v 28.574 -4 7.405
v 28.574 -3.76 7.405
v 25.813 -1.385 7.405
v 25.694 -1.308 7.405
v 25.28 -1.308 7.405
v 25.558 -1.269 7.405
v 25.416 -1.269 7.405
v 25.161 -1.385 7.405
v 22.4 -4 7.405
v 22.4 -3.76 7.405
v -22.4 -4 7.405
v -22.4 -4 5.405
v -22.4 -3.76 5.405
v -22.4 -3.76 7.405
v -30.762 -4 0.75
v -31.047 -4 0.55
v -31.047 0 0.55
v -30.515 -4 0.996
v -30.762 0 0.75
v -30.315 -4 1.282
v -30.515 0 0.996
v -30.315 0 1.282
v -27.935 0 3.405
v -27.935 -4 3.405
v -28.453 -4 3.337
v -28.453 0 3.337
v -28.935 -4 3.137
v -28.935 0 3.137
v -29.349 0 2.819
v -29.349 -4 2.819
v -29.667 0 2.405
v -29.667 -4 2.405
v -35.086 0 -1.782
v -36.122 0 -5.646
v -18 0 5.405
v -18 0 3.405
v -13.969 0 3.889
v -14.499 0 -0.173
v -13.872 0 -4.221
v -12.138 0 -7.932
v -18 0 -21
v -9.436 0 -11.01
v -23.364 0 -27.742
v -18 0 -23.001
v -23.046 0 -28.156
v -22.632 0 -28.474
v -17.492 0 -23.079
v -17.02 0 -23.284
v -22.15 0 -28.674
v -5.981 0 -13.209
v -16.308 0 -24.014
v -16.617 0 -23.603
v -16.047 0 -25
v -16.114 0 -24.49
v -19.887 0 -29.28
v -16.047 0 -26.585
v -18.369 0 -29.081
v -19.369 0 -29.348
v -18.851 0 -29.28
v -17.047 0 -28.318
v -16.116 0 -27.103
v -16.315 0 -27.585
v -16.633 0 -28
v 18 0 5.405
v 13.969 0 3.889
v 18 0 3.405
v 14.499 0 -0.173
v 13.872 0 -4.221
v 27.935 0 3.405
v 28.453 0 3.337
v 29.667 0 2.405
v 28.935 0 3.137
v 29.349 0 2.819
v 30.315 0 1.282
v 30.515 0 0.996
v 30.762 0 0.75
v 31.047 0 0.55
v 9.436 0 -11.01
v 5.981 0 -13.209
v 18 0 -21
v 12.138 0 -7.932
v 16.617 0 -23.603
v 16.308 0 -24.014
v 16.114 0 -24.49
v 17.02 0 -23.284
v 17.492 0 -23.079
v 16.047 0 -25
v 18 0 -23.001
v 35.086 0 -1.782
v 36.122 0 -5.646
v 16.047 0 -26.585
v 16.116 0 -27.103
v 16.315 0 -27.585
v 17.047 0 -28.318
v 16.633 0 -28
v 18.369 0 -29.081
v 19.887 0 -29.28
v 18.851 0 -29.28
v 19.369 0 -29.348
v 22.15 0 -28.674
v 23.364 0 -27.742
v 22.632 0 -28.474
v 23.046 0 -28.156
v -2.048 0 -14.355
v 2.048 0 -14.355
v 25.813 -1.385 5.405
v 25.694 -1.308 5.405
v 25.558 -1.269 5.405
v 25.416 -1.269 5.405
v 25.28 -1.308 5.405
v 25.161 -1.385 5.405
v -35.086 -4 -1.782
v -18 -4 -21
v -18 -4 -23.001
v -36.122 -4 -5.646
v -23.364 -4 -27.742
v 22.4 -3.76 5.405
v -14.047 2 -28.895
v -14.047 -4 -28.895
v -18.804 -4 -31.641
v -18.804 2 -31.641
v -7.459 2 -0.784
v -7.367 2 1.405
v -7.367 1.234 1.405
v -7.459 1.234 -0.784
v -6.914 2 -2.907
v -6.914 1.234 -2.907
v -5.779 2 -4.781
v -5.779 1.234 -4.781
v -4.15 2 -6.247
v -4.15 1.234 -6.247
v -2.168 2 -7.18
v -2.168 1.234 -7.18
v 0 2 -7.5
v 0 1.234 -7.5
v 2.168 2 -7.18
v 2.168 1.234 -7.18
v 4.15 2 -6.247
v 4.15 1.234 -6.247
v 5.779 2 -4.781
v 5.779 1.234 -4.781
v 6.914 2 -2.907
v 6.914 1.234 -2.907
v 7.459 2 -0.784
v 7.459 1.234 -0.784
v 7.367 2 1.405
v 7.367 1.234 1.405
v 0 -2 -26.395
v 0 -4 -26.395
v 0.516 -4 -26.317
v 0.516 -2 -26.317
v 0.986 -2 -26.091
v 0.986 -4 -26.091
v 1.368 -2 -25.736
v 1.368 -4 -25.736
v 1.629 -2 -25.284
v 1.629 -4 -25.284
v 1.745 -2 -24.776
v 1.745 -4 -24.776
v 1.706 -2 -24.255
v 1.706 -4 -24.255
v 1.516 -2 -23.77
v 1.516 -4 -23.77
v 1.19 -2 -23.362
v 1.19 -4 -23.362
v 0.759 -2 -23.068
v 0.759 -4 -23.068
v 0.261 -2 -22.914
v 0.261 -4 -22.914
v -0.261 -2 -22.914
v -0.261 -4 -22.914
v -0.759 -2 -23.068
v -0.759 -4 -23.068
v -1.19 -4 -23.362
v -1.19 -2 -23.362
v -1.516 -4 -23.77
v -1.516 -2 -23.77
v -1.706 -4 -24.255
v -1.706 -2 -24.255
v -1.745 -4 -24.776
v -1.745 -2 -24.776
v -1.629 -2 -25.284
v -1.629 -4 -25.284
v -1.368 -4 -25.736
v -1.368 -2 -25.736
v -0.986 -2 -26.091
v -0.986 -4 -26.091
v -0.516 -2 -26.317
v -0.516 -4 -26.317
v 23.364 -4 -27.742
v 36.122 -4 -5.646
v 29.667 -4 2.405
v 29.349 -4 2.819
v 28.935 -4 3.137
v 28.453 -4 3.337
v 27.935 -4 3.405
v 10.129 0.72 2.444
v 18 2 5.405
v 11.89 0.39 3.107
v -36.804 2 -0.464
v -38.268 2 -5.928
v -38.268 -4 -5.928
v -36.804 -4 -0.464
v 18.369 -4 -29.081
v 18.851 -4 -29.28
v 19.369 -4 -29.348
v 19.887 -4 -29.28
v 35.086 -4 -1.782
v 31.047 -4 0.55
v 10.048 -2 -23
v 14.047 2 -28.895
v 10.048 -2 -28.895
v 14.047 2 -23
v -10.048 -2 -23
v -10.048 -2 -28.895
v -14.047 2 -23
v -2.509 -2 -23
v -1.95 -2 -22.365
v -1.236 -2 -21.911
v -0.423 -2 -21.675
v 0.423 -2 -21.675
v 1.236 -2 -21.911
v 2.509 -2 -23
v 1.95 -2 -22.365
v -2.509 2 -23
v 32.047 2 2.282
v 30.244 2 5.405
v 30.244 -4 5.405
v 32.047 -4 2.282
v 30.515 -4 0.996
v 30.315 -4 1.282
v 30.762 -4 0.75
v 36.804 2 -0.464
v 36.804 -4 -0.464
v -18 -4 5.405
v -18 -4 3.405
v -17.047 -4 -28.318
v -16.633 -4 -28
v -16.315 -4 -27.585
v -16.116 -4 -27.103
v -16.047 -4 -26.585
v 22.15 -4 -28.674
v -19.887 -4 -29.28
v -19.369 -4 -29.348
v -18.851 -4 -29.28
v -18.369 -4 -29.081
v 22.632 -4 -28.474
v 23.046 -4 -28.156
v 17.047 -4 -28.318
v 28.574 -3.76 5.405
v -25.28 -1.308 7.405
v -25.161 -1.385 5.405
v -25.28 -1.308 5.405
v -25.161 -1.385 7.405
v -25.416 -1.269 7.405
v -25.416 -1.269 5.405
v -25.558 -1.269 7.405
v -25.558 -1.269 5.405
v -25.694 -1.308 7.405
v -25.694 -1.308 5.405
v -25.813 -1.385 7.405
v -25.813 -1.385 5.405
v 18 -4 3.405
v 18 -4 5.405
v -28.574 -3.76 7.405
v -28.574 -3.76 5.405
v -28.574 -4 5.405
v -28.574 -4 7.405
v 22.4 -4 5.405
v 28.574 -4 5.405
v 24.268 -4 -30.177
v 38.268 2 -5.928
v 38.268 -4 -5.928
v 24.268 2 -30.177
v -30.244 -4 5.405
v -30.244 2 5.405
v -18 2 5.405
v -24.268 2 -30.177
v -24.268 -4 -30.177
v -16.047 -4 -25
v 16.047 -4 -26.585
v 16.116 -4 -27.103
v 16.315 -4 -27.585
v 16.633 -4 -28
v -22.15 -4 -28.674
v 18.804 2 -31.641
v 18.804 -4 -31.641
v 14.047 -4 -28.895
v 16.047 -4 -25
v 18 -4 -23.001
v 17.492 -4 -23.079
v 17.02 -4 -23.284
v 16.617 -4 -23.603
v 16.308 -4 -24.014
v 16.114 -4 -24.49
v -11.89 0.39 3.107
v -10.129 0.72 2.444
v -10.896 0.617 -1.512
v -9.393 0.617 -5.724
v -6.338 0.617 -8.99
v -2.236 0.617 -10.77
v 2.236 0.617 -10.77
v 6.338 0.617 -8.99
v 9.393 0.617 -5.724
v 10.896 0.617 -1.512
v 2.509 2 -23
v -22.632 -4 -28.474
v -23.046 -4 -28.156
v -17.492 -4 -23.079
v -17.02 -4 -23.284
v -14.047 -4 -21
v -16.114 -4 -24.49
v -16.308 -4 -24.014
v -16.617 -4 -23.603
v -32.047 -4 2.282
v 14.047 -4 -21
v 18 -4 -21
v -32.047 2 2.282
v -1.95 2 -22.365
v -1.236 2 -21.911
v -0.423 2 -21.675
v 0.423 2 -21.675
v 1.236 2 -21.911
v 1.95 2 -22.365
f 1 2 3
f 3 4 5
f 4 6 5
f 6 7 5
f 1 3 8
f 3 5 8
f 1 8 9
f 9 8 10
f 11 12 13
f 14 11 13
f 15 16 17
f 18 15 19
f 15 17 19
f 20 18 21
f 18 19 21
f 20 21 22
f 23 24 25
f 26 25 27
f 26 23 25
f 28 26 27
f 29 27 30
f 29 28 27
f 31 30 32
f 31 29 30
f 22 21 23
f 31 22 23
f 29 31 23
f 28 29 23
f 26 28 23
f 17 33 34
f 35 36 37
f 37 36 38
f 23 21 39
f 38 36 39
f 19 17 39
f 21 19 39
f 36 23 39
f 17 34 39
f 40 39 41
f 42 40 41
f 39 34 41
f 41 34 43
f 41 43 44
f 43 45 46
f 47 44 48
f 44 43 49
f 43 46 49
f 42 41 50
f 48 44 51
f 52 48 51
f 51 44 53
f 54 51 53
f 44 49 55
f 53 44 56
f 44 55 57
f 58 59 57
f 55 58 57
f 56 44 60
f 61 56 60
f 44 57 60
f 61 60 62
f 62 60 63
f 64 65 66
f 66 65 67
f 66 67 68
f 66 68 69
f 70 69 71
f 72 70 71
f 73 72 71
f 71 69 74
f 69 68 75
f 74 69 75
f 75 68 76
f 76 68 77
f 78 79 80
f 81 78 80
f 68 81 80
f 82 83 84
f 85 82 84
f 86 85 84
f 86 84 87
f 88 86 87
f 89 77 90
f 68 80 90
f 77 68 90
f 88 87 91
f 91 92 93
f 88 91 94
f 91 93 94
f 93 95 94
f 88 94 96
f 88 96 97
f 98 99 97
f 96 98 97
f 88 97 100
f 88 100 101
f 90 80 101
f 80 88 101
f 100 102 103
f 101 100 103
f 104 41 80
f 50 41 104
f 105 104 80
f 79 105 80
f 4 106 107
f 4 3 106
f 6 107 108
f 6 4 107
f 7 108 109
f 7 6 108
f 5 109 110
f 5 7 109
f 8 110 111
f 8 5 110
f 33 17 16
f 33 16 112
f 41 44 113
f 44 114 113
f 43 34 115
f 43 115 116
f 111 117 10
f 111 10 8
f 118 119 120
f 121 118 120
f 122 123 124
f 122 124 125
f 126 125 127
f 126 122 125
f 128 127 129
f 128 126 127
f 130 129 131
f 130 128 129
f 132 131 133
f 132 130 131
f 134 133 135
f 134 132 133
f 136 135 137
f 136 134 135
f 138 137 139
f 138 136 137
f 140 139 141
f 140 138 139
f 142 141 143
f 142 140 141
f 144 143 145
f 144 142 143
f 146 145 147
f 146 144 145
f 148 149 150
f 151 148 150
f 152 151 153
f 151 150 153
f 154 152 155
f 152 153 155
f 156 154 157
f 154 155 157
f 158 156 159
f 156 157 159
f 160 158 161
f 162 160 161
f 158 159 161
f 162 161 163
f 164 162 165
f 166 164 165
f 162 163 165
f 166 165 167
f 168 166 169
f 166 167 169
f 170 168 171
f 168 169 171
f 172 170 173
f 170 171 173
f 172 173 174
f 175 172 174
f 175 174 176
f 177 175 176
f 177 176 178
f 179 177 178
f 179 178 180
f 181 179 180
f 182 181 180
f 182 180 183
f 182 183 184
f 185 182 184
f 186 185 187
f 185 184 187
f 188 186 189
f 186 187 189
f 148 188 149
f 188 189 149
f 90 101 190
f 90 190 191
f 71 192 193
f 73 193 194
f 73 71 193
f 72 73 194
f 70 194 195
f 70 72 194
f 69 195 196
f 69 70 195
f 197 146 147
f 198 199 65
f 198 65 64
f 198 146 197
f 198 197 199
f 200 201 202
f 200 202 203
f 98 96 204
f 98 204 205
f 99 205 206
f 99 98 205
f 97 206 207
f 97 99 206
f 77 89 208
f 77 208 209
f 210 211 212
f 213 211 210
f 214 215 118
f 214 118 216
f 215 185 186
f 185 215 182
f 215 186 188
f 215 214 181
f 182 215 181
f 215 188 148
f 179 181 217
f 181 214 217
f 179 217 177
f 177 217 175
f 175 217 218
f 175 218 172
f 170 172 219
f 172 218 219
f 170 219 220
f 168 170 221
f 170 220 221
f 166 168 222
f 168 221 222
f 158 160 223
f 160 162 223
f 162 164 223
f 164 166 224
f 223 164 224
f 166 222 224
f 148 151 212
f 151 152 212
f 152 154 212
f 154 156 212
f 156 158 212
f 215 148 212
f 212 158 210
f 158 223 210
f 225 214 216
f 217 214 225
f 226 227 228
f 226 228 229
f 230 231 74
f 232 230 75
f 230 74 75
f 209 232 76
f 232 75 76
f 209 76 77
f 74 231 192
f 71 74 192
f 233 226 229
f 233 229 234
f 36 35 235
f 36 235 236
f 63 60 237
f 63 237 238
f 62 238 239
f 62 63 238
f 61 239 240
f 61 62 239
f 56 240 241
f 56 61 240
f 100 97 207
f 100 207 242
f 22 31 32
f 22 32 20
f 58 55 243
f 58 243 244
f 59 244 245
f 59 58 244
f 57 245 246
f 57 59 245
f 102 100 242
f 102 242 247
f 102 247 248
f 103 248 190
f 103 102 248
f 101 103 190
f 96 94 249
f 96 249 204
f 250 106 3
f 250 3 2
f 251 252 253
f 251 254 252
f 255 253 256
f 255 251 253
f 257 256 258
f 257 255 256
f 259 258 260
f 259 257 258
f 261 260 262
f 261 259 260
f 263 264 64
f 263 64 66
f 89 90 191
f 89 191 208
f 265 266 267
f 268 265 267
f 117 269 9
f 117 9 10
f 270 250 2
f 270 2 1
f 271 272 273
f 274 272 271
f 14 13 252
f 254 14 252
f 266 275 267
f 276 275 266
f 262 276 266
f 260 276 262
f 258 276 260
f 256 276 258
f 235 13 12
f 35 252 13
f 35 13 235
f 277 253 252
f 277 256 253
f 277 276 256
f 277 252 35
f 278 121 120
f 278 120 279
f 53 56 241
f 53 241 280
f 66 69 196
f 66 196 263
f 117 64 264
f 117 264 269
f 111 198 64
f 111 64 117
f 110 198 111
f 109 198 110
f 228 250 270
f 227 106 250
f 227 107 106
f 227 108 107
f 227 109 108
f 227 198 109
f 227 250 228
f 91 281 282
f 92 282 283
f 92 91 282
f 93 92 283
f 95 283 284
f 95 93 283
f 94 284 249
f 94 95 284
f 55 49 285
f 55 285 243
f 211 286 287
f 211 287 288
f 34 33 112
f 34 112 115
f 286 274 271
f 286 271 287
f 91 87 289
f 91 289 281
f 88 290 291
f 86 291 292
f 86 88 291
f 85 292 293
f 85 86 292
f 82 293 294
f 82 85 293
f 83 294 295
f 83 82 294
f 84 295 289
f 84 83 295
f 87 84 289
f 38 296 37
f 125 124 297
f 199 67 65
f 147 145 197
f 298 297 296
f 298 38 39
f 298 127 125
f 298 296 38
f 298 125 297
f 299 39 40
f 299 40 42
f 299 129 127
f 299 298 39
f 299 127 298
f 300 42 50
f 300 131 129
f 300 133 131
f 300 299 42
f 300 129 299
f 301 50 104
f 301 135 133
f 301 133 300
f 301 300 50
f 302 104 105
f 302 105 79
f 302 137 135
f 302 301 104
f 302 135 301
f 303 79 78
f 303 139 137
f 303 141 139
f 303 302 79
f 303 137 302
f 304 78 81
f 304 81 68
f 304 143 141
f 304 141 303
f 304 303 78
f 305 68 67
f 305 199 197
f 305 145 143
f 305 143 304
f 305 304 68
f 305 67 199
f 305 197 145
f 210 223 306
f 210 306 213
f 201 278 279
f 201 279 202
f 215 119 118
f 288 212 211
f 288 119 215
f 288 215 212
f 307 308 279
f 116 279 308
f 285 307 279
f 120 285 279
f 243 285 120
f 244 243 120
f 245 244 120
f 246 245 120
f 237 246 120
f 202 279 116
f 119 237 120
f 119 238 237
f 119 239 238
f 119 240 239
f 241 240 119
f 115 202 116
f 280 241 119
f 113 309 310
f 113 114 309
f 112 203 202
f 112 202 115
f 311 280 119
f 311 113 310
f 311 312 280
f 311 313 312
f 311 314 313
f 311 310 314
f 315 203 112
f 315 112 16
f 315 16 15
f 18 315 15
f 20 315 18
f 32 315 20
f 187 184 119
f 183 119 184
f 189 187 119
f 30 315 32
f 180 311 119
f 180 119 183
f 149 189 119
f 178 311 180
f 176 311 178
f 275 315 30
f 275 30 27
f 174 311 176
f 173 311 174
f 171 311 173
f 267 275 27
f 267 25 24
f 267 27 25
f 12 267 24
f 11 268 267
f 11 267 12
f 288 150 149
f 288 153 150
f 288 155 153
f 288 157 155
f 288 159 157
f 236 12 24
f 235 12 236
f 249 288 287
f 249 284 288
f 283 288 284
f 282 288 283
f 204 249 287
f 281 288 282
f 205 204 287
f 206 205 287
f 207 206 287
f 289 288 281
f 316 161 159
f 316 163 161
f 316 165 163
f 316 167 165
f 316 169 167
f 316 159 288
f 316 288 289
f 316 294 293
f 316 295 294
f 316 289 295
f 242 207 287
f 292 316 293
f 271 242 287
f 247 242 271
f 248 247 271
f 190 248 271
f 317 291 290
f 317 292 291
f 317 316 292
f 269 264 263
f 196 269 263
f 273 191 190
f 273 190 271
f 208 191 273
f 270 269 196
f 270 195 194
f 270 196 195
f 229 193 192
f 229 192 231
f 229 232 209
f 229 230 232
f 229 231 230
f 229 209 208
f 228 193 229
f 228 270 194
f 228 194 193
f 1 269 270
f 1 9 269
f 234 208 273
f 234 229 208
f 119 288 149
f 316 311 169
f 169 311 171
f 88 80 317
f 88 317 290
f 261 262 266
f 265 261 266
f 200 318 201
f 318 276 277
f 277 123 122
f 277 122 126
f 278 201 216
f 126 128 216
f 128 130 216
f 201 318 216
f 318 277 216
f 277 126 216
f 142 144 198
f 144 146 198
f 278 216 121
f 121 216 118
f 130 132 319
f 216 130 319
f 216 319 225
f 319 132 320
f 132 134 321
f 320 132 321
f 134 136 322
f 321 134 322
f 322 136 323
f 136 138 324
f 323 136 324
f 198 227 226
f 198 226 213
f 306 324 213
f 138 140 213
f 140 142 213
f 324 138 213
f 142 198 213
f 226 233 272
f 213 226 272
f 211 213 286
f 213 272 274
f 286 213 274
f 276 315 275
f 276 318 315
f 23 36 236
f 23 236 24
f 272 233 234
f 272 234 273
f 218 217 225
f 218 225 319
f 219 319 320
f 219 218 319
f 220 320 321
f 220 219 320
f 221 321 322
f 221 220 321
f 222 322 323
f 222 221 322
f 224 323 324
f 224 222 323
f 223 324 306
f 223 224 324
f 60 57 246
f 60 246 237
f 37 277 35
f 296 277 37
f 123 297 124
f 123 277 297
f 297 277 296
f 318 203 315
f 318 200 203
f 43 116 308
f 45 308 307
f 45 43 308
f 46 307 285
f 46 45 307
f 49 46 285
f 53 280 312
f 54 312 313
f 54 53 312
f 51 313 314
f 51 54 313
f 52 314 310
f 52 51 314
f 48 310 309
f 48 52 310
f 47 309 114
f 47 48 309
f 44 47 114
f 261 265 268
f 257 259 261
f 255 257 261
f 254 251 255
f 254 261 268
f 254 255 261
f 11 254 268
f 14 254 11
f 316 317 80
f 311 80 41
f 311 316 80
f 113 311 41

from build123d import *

# Parameters (mm, degrees)
BOSS_EXTRUDE6_DEPTH   = 2
BOSS_EXTRUDE6_2_DEPTH = 2
BOSS_EXTRUDE7_DEPTH   = 4
SKETCH15_W            = 28.094808214
SKETCH15_H            = 7.894882233
SKETCH15_R            = 1.75
BOSS_EXTRUDE8_DEPTH   = 2
BOSS_EXTRUDE9_DEPTH   = 2
FILLET3_R             = 0.5
FILLET3_OF_MIRROR2_R  = 0.5
BOSS_EXTRUDE10_DEPTH  = 2
BOSS_EXTRUDE11_DEPTH  = 4
CHAMFER2_SIZE         = 4
FILLET4_R             = 2
CHAMFER3_SIZE         = 7
CHAMFER3_SIZE2        = 1.234288865


# Some blends are built 0.0001 mm under size
with BuildPart() as part:
    # Sketch13 → Boss-Extrude6 (new body)
    with BuildSketch(Plane(origin=(0, 0, 0), x_dir=(1, 0, 0), z_dir=(0, 1, 0))):
        Polygon((-18, 21), (-14.047404107, 21), (-14.047404107, 28.894882233), (-18.803847577, 31.641016151), (-24.267949192, 30.176914536), (-38.267949192, 5.92820323), (-36.803847577, 0.464101615), (-32.047404107, -2.282032303), (-30.244289874, -5.405117767), (-30.12881982, -5.405117767), (-20, -5.405117767), (-18, -5.405117767), align=None)
    extrude(amount=BOSS_EXTRUDE6_DEPTH)



with BuildPart() as body_2:
    # Sketch13 → Boss-Extrude6 2 (new body)
    with BuildSketch(Plane(origin=(0, 0, 0), x_dir=(1, 0, 0), z_dir=(0, 1, 0))):
        Polygon((18, -5.405117767), (18, 21), (14.047404107, 21), (14.047404107, 28.894882233), (18.803847577, 31.641016151), (24.267949192, 30.176914536), (38.267949192, 5.92820323), (36.803847577, 0.464101615), (32.047404107, -2.282032303), (30.244289874, -5.405117767), (30.12881982, -5.405117767), (26.664718205, -5.405117767), (20, -5.405117767), align=None)
    extrude(amount=BOSS_EXTRUDE6_2_DEPTH)


with BuildPart() as part_1:
    add(part.part)

    add(body_2.part)  # Boss-Extrude7 merges body 2
    # Sketch14 → Boss-Extrude7 (add)
    with BuildSketch(Plane.XZ):
        Polygon((-30.244289874, 5.405117767), (-18, 5.405117767), (-18, 3.405117767), (-29.089589336, 3.405117767), (-30.583302492, 0.817930688), (-35.086408642, -1.78193886), (-36.121684822, -5.645642165), (-22.950111947, -28.459475601), (-19.086408642, -29.494751781), (-16.047404107, -27.740181695), (-16.047404107, -23), (-18, -23), (-18, -21), (-14.047404107, -21), (-14.047404107, -28.894882233), (-18.803847577, -31.641016151), (-24.267949192, -30.176914536), (-38.267949192, -5.92820323), (-36.803847577, -0.464101615), (-32.047404107, 2.282032303), align=None)
        Polygon((14.047404107, -21), (18, -21), (18, -23), (16.047404107, -23), (16.047404107, -27.740181695), (19.086408642, -29.494751781), (22.950111947, -28.459475601), (36.121684822, -5.645642165), (35.086408642, -1.78193886), (30.583302492, 0.817930688), (29.089589336, 3.405117767), (18, 3.405117767), (18, 5.405117767), (30.244289874, 5.405117767), (32.047404107, 2.282032303), (36.803847577, -0.464101615), (38.267949192, -5.92820323), (24.267949192, -30.176914536), (18.803847577, -31.641016151), (14.047404107, -28.894882233), align=None)
    extrude(amount=BOSS_EXTRUDE7_DEPTH)

    # Sketch15 → Boss-Extrude8 (add)
    with BuildSketch(Plane.XZ.offset(4)):
        with Locations((0, -24.947441117)):
            Rectangle(SKETCH15_W, SKETCH15_H)
        with Locations(Location((0, -24.644882233, 0), (0, 0, 270))):
            Circle(SKETCH15_R, mode=Mode.SUBTRACT)
    extrude(amount=-BOSS_EXTRUDE8_DEPTH)

    # Sketch16 → Boss-Extrude9 (add)
    with BuildSketch(Plane.XY.offset(5.405117767)):
        Polygon((-28.574119282, -3.76), (-28.574119282, -4), (-22.4, -4), (-22.4, -3.76), (-25.487059641, -1.104129474), align=None)
    boss_extrude9 = extrude(amount=BOSS_EXTRUDE9_DEPTH)

    # Fillet3
    fillet3_edges = [part_1.edges().sort_by_distance(p)[0] for p in [
        (-25.487059641, -1.104129474, 6.405117767),
    ]]
    fillet(fillet3_edges, radius=FILLET3_R)

    # Mirror2: Boss-Extrude9 across plane
    add(boss_extrude9.mirror(Plane(origin=(0, 0, 0), x_dir=(0, 0, 1), z_dir=(1, 0, 0))))

    # Fillet3 of Mirror2
    fillet3_of_mirror2_edges = [part_1.edges().sort_by_distance(p)[0] for p in [
        (25.487059641, -1.104129474, 6.405117767),
    ]]
    fillet(fillet3_of_mirror2_edges, radius=FILLET3_OF_MIRROR2_R)

    # Sketch17 → Boss-Extrude10 (add)
    with BuildSketch(Plane(origin=(0, 2, 0), x_dir=(1, 0, 0), z_dir=(0, 1, 0))):
        with BuildLine():
            Line((-18, -5.405117767), (-7.367200558, -1.405117767))
            ThreePointArc((-7.367200558, -1.405117767), (0, 7.5), (7.367200558, -1.405117767))
            Line((7.367200558, -1.405117767), (18, -5.405117767))
            Line((18, -5.405117767), (18, 21))
            Line((18, 21), (-18, 21))
            Line((-18, 21), (-18, -5.405117767))
        make_face()
    extrude(amount=-BOSS_EXTRUDE10_DEPTH)

    # Sketch18 → Boss-Extrude11 (add)
    with BuildSketch(Plane(origin=(0, -2, 0), x_dir=(1, 0, 0), z_dir=(0, 1, 0))):
        with BuildLine():
            Line((14.047404107, 21), (-14.047404107, 21))
            Line((-14.047404107, 21), (-14.047404107, 23))
            Line((-14.047404107, 23), (-2.508856799, 23))
            ThreePointArc((-2.508856799, 23), (0, 21.644882233), (2.508856799, 23))
            Line((2.508856799, 23), (14.047404107, 23))
            Line((14.047404107, 23), (14.047404107, 21))
        make_face()
    extrude(amount=BOSS_EXTRUDE11_DEPTH)

    # Chamfer2
    chamfer2_edges = [part_1.edges().sort_by_distance(p)[0] for p in [
        (14.047404107, -2, -25.947441117),
        (-14.047404107, -2, -25.947441117),
    ]]
    chamfer(chamfer2_edges, length=CHAMFER2_SIZE - 0.0001)  # a hair under: the kernel refuses the full size

    # Fillet4
    # the kernel refuses this fillet: 2 mm, written as the material it adds along each edge
    with BuildSketch(Plane(origin=(29.089589336, 2.886751346, 3.405117767), x_dir=(0.4999999999999999, 0, -0.8660254037844386), z_dir=(0, -1, 0))) as fillet4_piece_1_section:
        with BuildLine():
            CenterArc((FILLET4_R * 0.57735026919, -FILLET4_R), FILLET4_R, 90, 60)
            Line((-FILLET4_R * 0.288675134595, -FILLET4_R * 0.5), (0, 0))
            Line((0, 0), (FILLET4_R * 0.57735026919, 0))
        make_face()
    fillet4_piece_1 = extrude(amount=6.886751346, mode=Mode.PRIVATE)
    fillet4_piece_1 = split(fillet4_piece_1, bisect_by=Plane(origin=(28.968451808, 2, 3.195301414), z_dir=(0, -1, 0)), keep=Keep.TOP, mode=Mode.PRIVATE)
    add(fillet4_piece_1)
    with BuildSketch(Plane(origin=(-29.089589336, 2.886751346, 3.405117767), x_dir=(1, 0, 0), z_dir=(0, -1, 0))) as fillet4_piece_2_section:
        with BuildLine():
            CenterArc((FILLET4_R * 0.57735026919, -FILLET4_R), FILLET4_R, 90, 60)
            Line((-FILLET4_R * 0.288675134595, -FILLET4_R * 0.5), (0, 0))
            Line((0, 0), (FILLET4_R * 0.57735026919, 0))
        make_face()
    fillet4_piece_2 = extrude(amount=6.886751346, mode=Mode.PRIVATE)
    fillet4_piece_2 = split(fillet4_piece_2, bisect_by=Plane(origin=(-28.968451808, 2, 3.195301414), z_dir=(0, -1, 0)), keep=Keep.TOP, mode=Mode.PRIVATE)
    add(fillet4_piece_2)
    with BuildSketch(Plane(origin=(22.950111947, 2.071067812, -28.459475601), x_dir=(-0.9659258262890683, 0, -0.2588190451025206), z_dir=(0, -1, 0))) as fillet4_piece_3_section:
        with BuildLine():
            CenterArc((FILLET4_R * 0.414213562373, -FILLET4_R), FILLET4_R, 90, 45)
            Line((-FILLET4_R * 0.292893218813, -FILLET4_R * 0.292893218813), (0, 0))
            Line((0, 0), (FILLET4_R * 0.414213562373, 0))
        make_face()
    fillet4_piece_3 = extrude(amount=6.071067812, mode=Mode.PRIVATE)
    fillet4_piece_3 = split(fillet4_piece_3, bisect_by=Plane(origin=(22.870823982, 2, -28.356145514), z_dir=(0, -1, 0)), keep=Keep.TOP, mode=Mode.PRIVATE)
    add(fillet4_piece_3)
    with BuildSketch(Plane(origin=(19.086408642, 2.071067812, -29.494751781), x_dir=(-0.8660254037844382, 0, 0.500000000000001), z_dir=(0, -1, 0))) as fillet4_piece_4_section:
        with BuildLine():
            CenterArc((FILLET4_R * 0.414213562373, -FILLET4_R), FILLET4_R, 90, 45)
            Line((-FILLET4_R * 0.292893218813, -FILLET4_R * 0.292893218813), (0, 0))
            Line((0, 0), (FILLET4_R * 0.414213562373, 0))
        make_face()
    fillet4_piece_4 = extrude(amount=6.071067812, mode=Mode.PRIVATE)
    fillet4_piece_4 = split(fillet4_piece_4, bisect_by=Plane(origin=(19.10340899, 2, -29.365621318), z_dir=(0, -1, 0)), keep=Keep.TOP, mode=Mode.PRIVATE)
    add(fillet4_piece_4)
    with BuildSketch(Plane(origin=(16.047404107, 2.886751346, -27.740181695), x_dir=(0, 0, 1), z_dir=(0, -1, 0))) as fillet4_piece_5_section:
        with BuildLine():
            CenterArc((FILLET4_R * 0.57735026919, -FILLET4_R), FILLET4_R, 90, 60)
            Line((-FILLET4_R * 0.288675134595, -FILLET4_R * 0.5), (0, 0))
            Line((0, 0), (FILLET4_R * 0.57735026919, 0))
        make_face()
    fillet4_piece_5 = extrude(amount=6.886751346, mode=Mode.PRIVATE)
    fillet4_piece_5 = split(fillet4_piece_5, bisect_by=Plane(origin=(16.257220459, 2, -27.619044168), z_dir=(0, -1, 0)), keep=Keep.TOP, mode=Mode.PRIVATE)
    add(fillet4_piece_5)
    with BuildSketch(Plane(origin=(-22.950111947, 2.071067812, -28.459475601), x_dir=(-0.500000000000001, 0, 0.8660254037844382), z_dir=(0, -1, 0))) as fillet4_piece_6_section:
        with BuildLine():
            CenterArc((FILLET4_R * 0.414213562373, -FILLET4_R), FILLET4_R, 90, 45)
            Line((-FILLET4_R * 0.292893218813, -FILLET4_R * 0.292893218813), (0, 0))
            Line((0, 0), (FILLET4_R * 0.414213562373, 0))
        make_face()
    fillet4_piece_6 = extrude(amount=6.071067812, mode=Mode.PRIVATE)
    fillet4_piece_6 = split(fillet4_piece_6, bisect_by=Plane(origin=(-22.870823982, 2, -28.356145514), z_dir=(0, -1, 0)), keep=Keep.TOP, mode=Mode.PRIVATE)
    add(fillet4_piece_6)
    with BuildSketch(Plane(origin=(-19.086408642, 2.071067812, -29.494751781), x_dir=(-0.9659258262890694, 0, 0.2588190451025166), z_dir=(0, -1, 0))) as fillet4_piece_7_section:
        with BuildLine():
            CenterArc((FILLET4_R * 0.414213562373, -FILLET4_R), FILLET4_R, 90, 45)
            Line((-FILLET4_R * 0.292893218813, -FILLET4_R * 0.292893218813), (0, 0))
            Line((0, 0), (FILLET4_R * 0.414213562373, 0))
        make_face()
    fillet4_piece_7 = extrude(amount=6.071067812, mode=Mode.PRIVATE)
    fillet4_piece_7 = split(fillet4_piece_7, bisect_by=Plane(origin=(-19.10340899, 2, -29.365621318), z_dir=(0, -1, 0)), keep=Keep.TOP, mode=Mode.PRIVATE)
    add(fillet4_piece_7)
    with BuildSketch(Plane(origin=(-16.047404107, 2.886751346, -27.740181695), x_dir=(-0.8660254037844385, 0, -0.5000000000000003), z_dir=(0, -1, 0))) as fillet4_piece_8_section:
        with BuildLine():
            CenterArc((FILLET4_R * 0.57735026919, -FILLET4_R), FILLET4_R, 90, 60)
            Line((-FILLET4_R * 0.288675134595, -FILLET4_R * 0.5), (0, 0))
            Line((0, 0), (FILLET4_R * 0.57735026919, 0))
        make_face()
    fillet4_piece_8 = extrude(amount=6.886751346, mode=Mode.PRIVATE)
    fillet4_piece_8 = split(fillet4_piece_8, bisect_by=Plane(origin=(-16.257220459, 2, -27.619044168), z_dir=(0, -1, 0)), keep=Keep.TOP, mode=Mode.PRIVATE)
    add(fillet4_piece_8)
    with BuildSketch(Plane(origin=(-16.047404107, 5, -23), x_dir=(0, 0, -1), z_dir=(0, -1, 0))) as fillet4_piece_9_section:
        with BuildLine():
            CenterArc((FILLET4_R, -FILLET4_R), FILLET4_R, 90, 90)
            Line((0, -FILLET4_R), (0, 0))
            Line((0, 0), (FILLET4_R, 0))
        make_face()
    fillet4_piece_9 = extrude(amount=9, mode=Mode.PRIVATE)
    fillet4_piece_9 = split(fillet4_piece_9, bisect_by=Plane(origin=(-18, -2, -23.446740496), z_dir=(1, 0, 0)), keep=Keep.TOP, mode=Mode.PRIVATE)
    fillet4_piece_9 = split(fillet4_piece_9, bisect_by=Plane(origin=(-16.494124288, 2, -23.446740496), z_dir=(0, -1, 0)), keep=Keep.TOP, mode=Mode.PRIVATE)
    add(fillet4_piece_9)
    with BuildSketch(Plane(origin=(16.047404107, 5, -23), x_dir=(1, 0, 0), z_dir=(0, -1, 0))) as fillet4_piece_10_section:
        with BuildLine():
            CenterArc((FILLET4_R, -FILLET4_R), FILLET4_R, 90, 90)
            Line((0, -FILLET4_R), (0, 0))
            Line((0, 0), (FILLET4_R, 0))
        make_face()
    fillet4_piece_10 = extrude(amount=9, mode=Mode.PRIVATE)
    fillet4_piece_10 = split(fillet4_piece_10, bisect_by=Plane(origin=(18, -2, -23.446740496), z_dir=(-1, 0, 0)), keep=Keep.TOP, mode=Mode.PRIVATE)
    fillet4_piece_10 = split(fillet4_piece_10, bisect_by=Plane(origin=(16.494124288, 2, -23.446740496), z_dir=(0, -1, 0)), keep=Keep.TOP, mode=Mode.PRIVATE)
    add(fillet4_piece_10)
    # the kernel refuses this fillet: 2 mm, written as the material it takes off along each edge
    with BuildSketch(Plane(origin=(30.583302492, 0, 0.817930688), x_dir=(0.8660254037844376, 0, -0.500000000000002), z_dir=(0, -1, 0)), Plane(origin=(-30.583302492, 0, 0.817930688), x_dir=(0.5000000000000039, 0, 0.8660254037844364), z_dir=(0, -1, 0))) as fillet4_2_piece_1:
        with BuildLine():
            CenterArc((FILLET4_R * 0.267949192431, FILLET4_R), FILLET4_R, 240, 30)
            Line((-FILLET4_R * 0.232050807569, FILLET4_R * 0.133974596216), (0, 0))
            Line((0, 0), (FILLET4_R * 0.267949192431, 0))
        make_face()
    extrude(amount=5.339745962, mode=Mode.SUBTRACT)

    # Chamfer3
    chamfer3_edges = [part_1.edges().sort_by_distance(p)[0] for p in [
        (0, 0, -7.5),
    ]]
    chamfer3_side = [part_1.faces().sort_by_distance(p)[0] for p in [
        (0, 0, -10.489967156),
    ]]
    chamfer(chamfer3_edges, length=CHAMFER3_SIZE, length2=CHAMFER3_SIZE2, reference=chamfer3_side[0])


solid = part_1.part
